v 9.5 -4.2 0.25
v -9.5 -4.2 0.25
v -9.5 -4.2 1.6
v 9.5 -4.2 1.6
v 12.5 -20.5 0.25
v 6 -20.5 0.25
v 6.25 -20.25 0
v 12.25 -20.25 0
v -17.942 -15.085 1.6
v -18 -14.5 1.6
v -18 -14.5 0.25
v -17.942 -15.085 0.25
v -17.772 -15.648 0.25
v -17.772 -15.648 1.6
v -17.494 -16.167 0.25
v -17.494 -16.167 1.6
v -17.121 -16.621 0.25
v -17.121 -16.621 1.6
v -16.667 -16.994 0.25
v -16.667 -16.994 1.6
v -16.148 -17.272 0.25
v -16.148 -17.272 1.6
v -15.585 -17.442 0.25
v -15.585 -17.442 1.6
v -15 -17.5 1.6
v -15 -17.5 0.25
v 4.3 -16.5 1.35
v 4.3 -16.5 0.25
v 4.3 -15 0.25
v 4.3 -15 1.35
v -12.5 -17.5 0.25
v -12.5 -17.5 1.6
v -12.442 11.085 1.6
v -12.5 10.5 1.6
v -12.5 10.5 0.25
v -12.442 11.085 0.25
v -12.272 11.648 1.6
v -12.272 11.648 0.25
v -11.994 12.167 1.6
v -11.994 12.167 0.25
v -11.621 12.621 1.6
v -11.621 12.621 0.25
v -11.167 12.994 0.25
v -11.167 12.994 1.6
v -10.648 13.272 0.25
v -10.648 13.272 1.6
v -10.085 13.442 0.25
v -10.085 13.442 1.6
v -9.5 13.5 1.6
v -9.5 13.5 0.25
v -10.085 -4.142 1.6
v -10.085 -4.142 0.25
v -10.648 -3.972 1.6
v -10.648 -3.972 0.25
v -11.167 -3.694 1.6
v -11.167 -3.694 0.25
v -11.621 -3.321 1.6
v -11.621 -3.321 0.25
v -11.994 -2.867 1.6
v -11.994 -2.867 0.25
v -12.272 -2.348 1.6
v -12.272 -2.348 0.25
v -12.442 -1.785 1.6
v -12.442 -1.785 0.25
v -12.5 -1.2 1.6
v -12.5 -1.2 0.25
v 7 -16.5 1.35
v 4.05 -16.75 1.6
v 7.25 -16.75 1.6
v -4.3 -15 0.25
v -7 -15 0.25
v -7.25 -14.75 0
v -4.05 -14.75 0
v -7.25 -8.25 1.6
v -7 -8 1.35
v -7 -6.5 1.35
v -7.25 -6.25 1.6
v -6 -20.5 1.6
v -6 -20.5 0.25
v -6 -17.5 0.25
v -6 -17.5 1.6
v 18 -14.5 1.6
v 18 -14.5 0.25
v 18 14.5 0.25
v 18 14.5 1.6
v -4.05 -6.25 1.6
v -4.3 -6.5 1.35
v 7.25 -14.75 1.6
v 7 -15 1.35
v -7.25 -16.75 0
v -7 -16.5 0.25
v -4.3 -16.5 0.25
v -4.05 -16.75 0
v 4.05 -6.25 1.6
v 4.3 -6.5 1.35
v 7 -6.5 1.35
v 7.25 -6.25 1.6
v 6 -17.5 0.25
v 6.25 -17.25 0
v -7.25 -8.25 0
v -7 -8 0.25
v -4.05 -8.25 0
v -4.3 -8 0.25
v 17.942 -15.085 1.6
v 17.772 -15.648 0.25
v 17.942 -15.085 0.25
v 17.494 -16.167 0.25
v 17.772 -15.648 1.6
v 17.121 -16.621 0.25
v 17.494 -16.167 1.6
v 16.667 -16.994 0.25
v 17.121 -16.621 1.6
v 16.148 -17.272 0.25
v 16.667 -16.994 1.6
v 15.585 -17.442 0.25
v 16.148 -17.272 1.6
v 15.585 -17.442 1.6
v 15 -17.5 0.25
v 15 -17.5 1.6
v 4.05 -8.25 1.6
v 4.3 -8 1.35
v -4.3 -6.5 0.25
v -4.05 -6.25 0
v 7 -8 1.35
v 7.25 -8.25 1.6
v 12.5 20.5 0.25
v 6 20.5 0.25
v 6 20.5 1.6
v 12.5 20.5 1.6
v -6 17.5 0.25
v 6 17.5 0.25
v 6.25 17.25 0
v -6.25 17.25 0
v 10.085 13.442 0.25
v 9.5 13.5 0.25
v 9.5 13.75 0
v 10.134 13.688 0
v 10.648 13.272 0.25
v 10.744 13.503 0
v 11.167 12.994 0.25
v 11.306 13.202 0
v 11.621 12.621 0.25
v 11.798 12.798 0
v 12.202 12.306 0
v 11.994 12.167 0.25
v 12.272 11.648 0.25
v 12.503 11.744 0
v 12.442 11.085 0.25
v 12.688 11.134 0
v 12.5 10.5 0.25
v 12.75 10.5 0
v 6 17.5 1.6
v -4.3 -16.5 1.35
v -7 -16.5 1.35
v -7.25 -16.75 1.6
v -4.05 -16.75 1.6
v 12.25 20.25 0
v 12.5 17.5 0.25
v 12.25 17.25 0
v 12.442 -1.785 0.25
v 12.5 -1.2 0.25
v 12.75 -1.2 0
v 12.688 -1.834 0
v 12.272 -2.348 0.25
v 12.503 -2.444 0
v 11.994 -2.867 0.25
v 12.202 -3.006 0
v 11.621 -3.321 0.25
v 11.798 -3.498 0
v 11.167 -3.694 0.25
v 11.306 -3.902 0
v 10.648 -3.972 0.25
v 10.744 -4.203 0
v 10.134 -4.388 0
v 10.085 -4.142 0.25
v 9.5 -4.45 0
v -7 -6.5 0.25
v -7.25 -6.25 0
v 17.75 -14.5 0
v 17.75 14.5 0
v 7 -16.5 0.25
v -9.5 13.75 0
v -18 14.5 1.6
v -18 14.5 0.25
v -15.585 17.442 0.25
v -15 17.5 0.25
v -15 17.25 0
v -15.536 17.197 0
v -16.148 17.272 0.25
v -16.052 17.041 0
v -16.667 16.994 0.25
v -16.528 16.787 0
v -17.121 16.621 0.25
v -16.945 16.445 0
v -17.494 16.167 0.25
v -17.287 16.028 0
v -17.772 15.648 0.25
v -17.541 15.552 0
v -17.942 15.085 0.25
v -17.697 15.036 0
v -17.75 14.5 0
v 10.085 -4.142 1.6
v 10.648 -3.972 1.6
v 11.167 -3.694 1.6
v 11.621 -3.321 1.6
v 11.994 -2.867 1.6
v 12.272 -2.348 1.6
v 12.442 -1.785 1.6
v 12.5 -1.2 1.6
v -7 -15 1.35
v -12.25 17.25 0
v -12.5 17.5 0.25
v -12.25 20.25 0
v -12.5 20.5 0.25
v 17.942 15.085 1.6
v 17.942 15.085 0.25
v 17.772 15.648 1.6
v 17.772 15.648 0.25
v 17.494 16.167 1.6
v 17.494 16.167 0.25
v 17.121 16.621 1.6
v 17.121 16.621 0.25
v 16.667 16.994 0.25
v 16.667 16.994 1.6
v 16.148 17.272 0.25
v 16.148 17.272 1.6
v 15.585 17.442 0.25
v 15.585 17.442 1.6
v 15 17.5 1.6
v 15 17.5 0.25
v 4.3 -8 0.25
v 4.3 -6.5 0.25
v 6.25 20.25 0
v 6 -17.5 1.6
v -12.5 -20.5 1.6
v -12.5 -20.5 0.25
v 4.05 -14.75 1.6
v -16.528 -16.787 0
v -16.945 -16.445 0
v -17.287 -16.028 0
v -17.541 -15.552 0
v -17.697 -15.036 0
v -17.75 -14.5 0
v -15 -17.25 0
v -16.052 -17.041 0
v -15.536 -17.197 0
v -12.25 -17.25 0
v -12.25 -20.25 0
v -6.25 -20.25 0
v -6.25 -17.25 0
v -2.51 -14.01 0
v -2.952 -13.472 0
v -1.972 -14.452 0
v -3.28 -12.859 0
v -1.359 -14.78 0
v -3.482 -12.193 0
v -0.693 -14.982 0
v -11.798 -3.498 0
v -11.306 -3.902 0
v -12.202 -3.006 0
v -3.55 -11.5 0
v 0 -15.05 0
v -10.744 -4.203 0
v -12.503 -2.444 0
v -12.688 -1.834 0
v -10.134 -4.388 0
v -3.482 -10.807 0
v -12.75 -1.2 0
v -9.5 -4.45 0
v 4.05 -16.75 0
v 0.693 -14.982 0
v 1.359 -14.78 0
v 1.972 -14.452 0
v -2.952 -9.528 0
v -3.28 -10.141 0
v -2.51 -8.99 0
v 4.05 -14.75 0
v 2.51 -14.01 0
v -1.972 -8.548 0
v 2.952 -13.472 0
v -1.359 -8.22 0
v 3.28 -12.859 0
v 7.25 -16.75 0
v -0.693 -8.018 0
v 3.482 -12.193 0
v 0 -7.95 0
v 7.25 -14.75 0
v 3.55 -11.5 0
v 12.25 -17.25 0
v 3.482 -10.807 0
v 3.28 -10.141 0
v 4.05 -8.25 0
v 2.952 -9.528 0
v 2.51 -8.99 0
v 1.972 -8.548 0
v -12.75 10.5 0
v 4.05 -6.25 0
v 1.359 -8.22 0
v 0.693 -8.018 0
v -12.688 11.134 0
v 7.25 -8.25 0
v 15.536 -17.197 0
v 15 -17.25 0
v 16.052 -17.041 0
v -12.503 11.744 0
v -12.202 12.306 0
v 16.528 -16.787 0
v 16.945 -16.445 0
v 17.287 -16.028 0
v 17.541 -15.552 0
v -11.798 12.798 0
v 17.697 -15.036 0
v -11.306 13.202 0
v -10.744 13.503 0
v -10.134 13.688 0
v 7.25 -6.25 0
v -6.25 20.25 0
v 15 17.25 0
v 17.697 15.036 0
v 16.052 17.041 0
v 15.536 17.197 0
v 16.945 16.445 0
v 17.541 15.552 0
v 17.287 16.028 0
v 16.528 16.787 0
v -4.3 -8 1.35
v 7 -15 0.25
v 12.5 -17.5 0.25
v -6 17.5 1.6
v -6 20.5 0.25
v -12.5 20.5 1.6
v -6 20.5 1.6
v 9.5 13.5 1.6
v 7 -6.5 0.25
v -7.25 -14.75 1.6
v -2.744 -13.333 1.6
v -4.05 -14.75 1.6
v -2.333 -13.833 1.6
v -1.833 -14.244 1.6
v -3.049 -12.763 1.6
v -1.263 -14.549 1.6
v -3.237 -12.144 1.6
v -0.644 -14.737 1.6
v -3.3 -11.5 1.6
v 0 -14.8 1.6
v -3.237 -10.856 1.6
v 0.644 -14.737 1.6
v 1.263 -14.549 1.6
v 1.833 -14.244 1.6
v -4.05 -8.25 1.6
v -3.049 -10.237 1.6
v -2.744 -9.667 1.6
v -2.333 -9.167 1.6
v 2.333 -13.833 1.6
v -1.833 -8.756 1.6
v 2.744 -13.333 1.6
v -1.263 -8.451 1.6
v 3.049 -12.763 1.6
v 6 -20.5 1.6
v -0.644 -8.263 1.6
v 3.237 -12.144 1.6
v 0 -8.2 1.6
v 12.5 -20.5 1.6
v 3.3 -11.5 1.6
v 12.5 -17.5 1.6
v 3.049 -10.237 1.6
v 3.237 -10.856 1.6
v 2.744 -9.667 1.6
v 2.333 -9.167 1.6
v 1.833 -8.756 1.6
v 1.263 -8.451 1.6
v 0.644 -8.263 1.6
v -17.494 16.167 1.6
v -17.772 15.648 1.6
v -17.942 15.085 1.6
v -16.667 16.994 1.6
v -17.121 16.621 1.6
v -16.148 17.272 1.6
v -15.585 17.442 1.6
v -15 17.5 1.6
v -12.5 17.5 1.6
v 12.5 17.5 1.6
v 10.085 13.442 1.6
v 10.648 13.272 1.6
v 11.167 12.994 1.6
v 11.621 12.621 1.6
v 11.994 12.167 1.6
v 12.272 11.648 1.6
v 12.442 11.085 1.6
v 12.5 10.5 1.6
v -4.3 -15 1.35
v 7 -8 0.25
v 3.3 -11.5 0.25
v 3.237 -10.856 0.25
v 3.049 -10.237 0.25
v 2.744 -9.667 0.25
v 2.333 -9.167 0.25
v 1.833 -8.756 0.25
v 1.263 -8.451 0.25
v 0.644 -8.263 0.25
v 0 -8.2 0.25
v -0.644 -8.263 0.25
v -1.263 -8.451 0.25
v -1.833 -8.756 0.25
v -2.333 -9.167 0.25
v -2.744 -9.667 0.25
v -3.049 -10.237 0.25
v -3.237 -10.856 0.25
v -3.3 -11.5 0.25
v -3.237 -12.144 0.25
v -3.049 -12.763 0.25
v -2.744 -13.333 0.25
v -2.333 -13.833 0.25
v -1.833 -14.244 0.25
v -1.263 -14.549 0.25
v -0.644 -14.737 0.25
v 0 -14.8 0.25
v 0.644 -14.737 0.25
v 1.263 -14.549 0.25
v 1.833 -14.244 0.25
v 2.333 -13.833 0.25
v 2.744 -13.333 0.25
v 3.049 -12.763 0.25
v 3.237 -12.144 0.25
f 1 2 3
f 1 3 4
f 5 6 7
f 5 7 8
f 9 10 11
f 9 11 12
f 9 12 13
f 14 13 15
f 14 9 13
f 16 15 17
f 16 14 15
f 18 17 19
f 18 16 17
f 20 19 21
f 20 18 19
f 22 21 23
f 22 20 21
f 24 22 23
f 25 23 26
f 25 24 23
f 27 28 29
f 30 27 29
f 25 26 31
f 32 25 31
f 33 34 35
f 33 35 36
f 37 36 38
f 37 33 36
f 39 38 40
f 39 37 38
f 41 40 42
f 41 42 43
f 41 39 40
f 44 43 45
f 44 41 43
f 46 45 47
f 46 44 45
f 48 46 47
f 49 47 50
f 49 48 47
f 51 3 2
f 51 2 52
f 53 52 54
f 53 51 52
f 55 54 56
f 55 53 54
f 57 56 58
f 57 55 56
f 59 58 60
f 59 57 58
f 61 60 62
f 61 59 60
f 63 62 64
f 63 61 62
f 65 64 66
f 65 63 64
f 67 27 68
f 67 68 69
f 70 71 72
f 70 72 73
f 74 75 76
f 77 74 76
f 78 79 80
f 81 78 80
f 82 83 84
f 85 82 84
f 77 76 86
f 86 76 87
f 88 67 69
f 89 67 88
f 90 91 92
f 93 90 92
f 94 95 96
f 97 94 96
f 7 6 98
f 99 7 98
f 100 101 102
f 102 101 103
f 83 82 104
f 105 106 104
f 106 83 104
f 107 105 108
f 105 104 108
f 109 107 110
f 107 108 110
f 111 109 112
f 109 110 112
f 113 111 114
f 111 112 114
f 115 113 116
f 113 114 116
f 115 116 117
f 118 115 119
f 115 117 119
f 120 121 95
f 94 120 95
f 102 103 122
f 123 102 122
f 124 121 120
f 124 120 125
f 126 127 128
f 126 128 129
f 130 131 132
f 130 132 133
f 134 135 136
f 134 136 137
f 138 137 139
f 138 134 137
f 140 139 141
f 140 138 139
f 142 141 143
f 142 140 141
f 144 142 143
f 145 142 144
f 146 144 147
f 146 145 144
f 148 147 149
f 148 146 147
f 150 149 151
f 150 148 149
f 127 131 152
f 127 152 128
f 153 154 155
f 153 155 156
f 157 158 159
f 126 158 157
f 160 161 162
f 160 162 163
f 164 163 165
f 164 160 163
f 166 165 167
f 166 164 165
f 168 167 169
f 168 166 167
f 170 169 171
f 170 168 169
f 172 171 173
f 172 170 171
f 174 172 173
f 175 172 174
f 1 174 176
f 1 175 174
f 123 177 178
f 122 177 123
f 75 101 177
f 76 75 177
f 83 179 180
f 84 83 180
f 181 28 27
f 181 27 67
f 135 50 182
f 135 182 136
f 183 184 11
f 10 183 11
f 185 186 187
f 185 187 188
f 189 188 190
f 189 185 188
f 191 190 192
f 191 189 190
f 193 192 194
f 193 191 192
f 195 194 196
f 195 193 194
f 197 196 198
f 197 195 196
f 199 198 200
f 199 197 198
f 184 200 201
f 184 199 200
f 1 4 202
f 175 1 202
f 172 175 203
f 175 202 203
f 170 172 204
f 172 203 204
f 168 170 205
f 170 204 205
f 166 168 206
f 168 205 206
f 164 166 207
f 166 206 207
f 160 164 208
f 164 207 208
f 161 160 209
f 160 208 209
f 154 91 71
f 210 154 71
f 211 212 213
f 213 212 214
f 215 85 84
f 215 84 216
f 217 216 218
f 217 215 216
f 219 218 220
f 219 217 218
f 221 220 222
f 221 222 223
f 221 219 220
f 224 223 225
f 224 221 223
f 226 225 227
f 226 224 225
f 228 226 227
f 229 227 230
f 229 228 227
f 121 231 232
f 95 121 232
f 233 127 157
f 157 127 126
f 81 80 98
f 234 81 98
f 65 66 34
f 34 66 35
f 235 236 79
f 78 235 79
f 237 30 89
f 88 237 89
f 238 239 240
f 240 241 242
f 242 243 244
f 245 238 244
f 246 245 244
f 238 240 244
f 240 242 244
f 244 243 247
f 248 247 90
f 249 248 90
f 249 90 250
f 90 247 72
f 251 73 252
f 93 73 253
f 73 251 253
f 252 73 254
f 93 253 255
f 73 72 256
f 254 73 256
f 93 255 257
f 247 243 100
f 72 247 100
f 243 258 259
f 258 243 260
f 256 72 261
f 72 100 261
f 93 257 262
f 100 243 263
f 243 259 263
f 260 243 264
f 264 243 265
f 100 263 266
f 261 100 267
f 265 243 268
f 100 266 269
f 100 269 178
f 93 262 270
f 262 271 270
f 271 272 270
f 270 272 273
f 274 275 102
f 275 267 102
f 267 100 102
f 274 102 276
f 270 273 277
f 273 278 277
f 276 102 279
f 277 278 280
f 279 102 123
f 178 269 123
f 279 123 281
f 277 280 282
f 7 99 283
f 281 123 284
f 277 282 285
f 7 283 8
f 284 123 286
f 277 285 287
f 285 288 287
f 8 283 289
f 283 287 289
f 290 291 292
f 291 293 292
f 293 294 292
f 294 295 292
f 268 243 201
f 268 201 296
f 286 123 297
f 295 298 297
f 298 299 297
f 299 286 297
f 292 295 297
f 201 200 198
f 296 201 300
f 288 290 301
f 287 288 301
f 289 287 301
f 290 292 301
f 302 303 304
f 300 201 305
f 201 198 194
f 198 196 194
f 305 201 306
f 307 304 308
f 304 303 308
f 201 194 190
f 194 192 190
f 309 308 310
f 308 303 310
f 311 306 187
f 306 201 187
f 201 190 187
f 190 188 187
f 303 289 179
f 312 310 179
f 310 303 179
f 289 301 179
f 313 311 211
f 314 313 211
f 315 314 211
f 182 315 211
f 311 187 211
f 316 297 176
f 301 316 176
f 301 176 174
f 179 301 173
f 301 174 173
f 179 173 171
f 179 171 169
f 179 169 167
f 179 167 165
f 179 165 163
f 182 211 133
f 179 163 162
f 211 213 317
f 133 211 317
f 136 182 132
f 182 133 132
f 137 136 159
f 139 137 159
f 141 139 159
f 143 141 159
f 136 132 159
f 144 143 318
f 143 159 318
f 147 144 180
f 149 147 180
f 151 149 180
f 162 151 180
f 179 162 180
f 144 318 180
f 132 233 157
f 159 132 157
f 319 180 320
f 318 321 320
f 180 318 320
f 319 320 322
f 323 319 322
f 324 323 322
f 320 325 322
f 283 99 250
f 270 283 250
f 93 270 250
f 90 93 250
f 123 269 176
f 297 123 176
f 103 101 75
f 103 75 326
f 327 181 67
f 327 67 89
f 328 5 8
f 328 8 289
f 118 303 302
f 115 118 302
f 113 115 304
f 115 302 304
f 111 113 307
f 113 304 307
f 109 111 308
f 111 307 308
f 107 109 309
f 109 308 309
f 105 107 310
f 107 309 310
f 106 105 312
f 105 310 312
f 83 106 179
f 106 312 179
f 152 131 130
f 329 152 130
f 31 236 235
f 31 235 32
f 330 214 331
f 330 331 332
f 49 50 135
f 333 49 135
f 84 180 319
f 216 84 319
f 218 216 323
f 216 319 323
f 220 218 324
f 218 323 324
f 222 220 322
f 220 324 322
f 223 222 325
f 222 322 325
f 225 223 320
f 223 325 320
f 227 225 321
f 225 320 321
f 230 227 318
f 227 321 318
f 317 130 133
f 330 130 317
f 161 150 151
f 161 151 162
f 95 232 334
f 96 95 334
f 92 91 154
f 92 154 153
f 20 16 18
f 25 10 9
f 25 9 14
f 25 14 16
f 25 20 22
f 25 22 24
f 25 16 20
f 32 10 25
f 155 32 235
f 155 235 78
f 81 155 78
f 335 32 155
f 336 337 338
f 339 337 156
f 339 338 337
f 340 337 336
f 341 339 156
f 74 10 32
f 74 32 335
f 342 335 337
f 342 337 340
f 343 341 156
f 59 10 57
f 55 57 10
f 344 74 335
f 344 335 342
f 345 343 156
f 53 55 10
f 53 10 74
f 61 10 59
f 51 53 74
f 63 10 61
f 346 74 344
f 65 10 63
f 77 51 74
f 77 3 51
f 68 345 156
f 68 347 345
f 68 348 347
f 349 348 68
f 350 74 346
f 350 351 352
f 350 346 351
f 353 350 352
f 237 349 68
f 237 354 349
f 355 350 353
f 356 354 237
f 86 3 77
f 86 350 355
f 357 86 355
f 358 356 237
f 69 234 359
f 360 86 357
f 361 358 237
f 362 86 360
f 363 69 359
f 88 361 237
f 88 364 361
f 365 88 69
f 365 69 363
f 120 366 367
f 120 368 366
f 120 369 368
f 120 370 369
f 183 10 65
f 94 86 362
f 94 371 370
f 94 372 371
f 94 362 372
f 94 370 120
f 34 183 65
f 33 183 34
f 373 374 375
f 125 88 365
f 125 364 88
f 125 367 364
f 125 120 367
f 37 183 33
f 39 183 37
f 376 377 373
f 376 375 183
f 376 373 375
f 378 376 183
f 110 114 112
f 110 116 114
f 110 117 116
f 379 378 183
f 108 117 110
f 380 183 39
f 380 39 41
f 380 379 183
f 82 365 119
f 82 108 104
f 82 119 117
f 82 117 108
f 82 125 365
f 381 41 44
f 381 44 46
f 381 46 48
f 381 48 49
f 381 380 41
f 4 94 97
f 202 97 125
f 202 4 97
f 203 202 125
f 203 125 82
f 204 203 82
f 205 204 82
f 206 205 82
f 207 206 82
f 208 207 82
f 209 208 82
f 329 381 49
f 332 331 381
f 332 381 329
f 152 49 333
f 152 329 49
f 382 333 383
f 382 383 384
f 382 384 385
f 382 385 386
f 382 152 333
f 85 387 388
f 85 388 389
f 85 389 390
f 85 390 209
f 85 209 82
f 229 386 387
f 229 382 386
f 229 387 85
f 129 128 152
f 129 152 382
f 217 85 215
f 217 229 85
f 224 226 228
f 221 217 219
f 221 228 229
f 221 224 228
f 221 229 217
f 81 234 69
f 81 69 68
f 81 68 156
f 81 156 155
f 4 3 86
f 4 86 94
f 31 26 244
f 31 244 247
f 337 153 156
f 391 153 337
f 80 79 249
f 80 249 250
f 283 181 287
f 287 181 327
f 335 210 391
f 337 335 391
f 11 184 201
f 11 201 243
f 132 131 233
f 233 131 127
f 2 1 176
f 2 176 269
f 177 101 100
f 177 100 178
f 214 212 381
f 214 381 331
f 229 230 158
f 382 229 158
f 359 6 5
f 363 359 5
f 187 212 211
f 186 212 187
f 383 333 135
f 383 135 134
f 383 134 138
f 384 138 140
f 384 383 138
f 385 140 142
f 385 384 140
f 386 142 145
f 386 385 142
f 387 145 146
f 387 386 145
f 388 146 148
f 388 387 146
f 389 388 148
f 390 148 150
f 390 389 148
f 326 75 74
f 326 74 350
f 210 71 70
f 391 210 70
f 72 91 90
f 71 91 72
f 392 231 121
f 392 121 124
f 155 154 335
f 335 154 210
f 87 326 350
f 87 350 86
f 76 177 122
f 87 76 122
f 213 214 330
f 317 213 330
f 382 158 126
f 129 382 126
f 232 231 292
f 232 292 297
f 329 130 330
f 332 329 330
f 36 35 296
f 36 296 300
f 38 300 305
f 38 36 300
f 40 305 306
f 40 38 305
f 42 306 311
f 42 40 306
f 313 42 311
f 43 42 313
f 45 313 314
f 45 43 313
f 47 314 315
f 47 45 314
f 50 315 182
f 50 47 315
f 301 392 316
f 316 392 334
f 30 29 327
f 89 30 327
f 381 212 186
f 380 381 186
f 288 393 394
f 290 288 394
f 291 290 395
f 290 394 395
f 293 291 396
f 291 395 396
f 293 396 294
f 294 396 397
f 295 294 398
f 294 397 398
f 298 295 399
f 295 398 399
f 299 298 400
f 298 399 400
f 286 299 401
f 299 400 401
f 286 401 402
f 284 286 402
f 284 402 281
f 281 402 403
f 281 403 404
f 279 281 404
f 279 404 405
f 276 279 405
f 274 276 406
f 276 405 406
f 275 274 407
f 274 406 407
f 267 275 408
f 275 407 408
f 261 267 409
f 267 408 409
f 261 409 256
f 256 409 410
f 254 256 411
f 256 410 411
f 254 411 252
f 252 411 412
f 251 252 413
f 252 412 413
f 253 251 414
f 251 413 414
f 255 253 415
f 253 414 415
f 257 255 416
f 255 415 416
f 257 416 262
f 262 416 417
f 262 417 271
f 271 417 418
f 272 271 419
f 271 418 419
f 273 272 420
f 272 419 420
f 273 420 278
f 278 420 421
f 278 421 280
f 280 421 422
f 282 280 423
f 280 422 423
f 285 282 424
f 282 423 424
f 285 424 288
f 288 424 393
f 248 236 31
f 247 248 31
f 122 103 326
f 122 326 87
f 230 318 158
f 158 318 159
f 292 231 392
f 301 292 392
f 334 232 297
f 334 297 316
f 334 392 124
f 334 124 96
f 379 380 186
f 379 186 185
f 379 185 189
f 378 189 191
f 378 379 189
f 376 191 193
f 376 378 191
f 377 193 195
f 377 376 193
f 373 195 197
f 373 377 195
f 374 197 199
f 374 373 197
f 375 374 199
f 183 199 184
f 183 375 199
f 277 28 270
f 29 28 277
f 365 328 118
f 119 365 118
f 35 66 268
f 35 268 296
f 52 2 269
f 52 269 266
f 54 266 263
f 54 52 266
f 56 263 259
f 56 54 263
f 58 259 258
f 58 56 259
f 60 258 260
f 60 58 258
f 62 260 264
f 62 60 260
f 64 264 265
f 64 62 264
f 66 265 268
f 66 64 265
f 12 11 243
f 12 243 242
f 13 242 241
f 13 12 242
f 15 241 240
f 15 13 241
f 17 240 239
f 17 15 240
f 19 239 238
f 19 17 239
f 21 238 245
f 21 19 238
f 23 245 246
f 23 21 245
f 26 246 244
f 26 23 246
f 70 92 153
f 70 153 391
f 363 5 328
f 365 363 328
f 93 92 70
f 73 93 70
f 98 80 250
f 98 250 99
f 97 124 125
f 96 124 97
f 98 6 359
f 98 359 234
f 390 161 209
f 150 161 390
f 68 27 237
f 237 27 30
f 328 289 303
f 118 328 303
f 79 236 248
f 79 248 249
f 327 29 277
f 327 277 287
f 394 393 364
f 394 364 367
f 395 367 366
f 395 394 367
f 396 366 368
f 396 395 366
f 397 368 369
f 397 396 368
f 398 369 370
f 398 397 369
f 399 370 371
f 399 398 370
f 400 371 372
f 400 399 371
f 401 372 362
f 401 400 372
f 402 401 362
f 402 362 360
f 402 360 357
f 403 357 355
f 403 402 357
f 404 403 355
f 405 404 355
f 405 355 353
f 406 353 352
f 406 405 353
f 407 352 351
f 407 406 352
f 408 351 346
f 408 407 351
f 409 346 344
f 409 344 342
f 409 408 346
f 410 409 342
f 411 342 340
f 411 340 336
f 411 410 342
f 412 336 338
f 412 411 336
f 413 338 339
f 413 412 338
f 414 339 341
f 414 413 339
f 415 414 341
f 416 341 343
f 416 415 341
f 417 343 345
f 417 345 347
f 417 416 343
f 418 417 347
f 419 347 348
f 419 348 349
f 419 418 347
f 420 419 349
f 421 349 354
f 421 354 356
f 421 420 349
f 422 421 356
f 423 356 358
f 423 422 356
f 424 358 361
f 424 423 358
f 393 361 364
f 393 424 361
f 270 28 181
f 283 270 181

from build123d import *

# Parameters (mm, degrees)
F0_W     = 2.7
F0_H     = 1.5
F0_R     = 3.3
F0_W_2   = 25
F0_H_2   = 17.7
F0_W_3   = 6.5
F0_H_3   = 3
F1_DEPTH = 1.6
F2_R     = 3
F3_SIZE  = 0.25


with BuildPart() as f1:
    # F0 (on Top) → F1 (new body)
    with BuildSketch(Plane.XY):
        Polygon((18, -17.5), (18, 17.5), (12.5, 17.5), (6, 17.5), (-6, 17.5), (-12.5, 17.5), (-18, 17.5), (-18, -17.5), (-12.5, -17.5), (-6, -17.5), (6, -17.5), (12.5, -17.5), align=None)
        with Locations((-5.65, -15.75)):
            Rectangle(F0_W, F0_H, mode=Mode.SUBTRACT)
        with Locations((-5.65, -7.25)):
            Rectangle(F0_W, F0_H, mode=Mode.SUBTRACT)
        with Locations((5.65, -15.75)):
            Rectangle(F0_W, F0_H, mode=Mode.SUBTRACT)
        with Locations((0, -11.5)):
            Circle(F0_R, mode=Mode.SUBTRACT)
        with Locations((5.65, -7.25)):
            Rectangle(F0_W, F0_H, mode=Mode.SUBTRACT)
        with Locations((0, 4.65)):
            Rectangle(F0_W_2, F0_H_2, mode=Mode.SUBTRACT)
        with Locations((9.25, 19)):
            Rectangle(F0_W_3, F0_H_3)
        with Locations((9.25, -19)):
            Rectangle(F0_W_3, F0_H_3)
        with Locations((-9.25, 19)):
            Rectangle(F0_W_3, F0_H_3)
        with Locations((-9.25, -19)):
            Rectangle(F0_W_3, F0_H_3)
    extrude(amount=F1_DEPTH)

    # F2
    f2_edges = [f1.edges().sort_by_distance(p)[0] for p in [
        (-18, 17.5, 0.8),
        (-18, -17.5, 0.8),
        (18, -17.5, 0.8),
        (18, 17.5, 0.8),
        (-12.5, -4.2, 0.8),
        (-12.5, 13.5, 0.8),
        (12.5, 13.5, 0.8),
        (12.5, -4.2, 0.8),
    ]]
    fillet(f2_edges, radius=F2_R)

    # F3
    f3_edges = [f1.edges().sort_by_distance(p)[0] for p in [
        (18, 0, 0),
        (17.12132, -16.62132, 0),
        (17.12132, 16.62132, 0),
        (13.75, -17.5, 0),
        (13.75, 17.5, 0),
        (12.5, -19, 0),
        (12.5, 19, 0),
        (9.25, -20.5, 0),
        (9.25, 20.5, 0),
        (6, -19, 0),
        (6, 19, 0),
        (0, -17.5, 0),
        (0, 17.5, 0),
        (-6, -19, 0),
        (-6, 19, 0),
        (-9.25, -20.5, 0),
        (-9.25, 20.5, 0),
        (-12.5, -19, 0),
        (-12.5, 19, 0),
        (-13.75, -17.5, 0),
        (-13.75, 17.5, 0),
        (-17.12132, -16.62132, 0),
        (-17.12132, 16.62132, 0),
        (-18, 0, 0),
        (-7, -15.75, 0),
        (-5.65, -15, 0),
        (-4.3, -15.75, 0),
        (-5.65, -16.5, 0),
        (-4.3, -7.25, 0),
        (-5.65, -8, 0),
        (-7, -7.25, 0),
        (-5.65, -6.5, 0),
        (4.3, -15.75, 0),
        (5.65, -15, 0),
        (7, -15.75, 0),
        (5.65, -16.5, 0),
        (-3.3, -11.5, 0),
        (5.65, -8, 0),
        (4.3, -7.25, 0),
        (5.65, -6.5, 0),
        (7, -7.25, 0),
        (-12.5, 4.65, 0),
        (-11.62132, -3.32132, 0),
        (-11.62132, 12.62132, 0),
        (0, -4.2, 0),
        (0, 13.5, 0),
        (11.62132, -3.32132, 0),
        (11.62132, 12.62132, 0),
        (12.5, 4.65, 0),
        (-7, -7.25, 1.6),
        (-5.65, -6.5, 1.6),
        (-4.3, -7.25, 1.6),
        (-5.65, -8, 1.6),
        (-5.65, -15, 1.6),
        (-7, -15.75, 1.6),
        (-5.65, -16.5, 1.6),
        (-4.3, -15.75, 1.6),
        (4.3, -7.25, 1.6),
        (5.65, -6.5, 1.6),
        (7, -7.25, 1.6),
        (5.65, -8, 1.6),
        (5.65, -15, 1.6),
        (4.3, -15.75, 1.6),
        (5.65, -16.5, 1.6),
        (7, -15.75, 1.6),
    ]]
    chamfer(f3_edges, length=F3_SIZE)


solid = f1.part
